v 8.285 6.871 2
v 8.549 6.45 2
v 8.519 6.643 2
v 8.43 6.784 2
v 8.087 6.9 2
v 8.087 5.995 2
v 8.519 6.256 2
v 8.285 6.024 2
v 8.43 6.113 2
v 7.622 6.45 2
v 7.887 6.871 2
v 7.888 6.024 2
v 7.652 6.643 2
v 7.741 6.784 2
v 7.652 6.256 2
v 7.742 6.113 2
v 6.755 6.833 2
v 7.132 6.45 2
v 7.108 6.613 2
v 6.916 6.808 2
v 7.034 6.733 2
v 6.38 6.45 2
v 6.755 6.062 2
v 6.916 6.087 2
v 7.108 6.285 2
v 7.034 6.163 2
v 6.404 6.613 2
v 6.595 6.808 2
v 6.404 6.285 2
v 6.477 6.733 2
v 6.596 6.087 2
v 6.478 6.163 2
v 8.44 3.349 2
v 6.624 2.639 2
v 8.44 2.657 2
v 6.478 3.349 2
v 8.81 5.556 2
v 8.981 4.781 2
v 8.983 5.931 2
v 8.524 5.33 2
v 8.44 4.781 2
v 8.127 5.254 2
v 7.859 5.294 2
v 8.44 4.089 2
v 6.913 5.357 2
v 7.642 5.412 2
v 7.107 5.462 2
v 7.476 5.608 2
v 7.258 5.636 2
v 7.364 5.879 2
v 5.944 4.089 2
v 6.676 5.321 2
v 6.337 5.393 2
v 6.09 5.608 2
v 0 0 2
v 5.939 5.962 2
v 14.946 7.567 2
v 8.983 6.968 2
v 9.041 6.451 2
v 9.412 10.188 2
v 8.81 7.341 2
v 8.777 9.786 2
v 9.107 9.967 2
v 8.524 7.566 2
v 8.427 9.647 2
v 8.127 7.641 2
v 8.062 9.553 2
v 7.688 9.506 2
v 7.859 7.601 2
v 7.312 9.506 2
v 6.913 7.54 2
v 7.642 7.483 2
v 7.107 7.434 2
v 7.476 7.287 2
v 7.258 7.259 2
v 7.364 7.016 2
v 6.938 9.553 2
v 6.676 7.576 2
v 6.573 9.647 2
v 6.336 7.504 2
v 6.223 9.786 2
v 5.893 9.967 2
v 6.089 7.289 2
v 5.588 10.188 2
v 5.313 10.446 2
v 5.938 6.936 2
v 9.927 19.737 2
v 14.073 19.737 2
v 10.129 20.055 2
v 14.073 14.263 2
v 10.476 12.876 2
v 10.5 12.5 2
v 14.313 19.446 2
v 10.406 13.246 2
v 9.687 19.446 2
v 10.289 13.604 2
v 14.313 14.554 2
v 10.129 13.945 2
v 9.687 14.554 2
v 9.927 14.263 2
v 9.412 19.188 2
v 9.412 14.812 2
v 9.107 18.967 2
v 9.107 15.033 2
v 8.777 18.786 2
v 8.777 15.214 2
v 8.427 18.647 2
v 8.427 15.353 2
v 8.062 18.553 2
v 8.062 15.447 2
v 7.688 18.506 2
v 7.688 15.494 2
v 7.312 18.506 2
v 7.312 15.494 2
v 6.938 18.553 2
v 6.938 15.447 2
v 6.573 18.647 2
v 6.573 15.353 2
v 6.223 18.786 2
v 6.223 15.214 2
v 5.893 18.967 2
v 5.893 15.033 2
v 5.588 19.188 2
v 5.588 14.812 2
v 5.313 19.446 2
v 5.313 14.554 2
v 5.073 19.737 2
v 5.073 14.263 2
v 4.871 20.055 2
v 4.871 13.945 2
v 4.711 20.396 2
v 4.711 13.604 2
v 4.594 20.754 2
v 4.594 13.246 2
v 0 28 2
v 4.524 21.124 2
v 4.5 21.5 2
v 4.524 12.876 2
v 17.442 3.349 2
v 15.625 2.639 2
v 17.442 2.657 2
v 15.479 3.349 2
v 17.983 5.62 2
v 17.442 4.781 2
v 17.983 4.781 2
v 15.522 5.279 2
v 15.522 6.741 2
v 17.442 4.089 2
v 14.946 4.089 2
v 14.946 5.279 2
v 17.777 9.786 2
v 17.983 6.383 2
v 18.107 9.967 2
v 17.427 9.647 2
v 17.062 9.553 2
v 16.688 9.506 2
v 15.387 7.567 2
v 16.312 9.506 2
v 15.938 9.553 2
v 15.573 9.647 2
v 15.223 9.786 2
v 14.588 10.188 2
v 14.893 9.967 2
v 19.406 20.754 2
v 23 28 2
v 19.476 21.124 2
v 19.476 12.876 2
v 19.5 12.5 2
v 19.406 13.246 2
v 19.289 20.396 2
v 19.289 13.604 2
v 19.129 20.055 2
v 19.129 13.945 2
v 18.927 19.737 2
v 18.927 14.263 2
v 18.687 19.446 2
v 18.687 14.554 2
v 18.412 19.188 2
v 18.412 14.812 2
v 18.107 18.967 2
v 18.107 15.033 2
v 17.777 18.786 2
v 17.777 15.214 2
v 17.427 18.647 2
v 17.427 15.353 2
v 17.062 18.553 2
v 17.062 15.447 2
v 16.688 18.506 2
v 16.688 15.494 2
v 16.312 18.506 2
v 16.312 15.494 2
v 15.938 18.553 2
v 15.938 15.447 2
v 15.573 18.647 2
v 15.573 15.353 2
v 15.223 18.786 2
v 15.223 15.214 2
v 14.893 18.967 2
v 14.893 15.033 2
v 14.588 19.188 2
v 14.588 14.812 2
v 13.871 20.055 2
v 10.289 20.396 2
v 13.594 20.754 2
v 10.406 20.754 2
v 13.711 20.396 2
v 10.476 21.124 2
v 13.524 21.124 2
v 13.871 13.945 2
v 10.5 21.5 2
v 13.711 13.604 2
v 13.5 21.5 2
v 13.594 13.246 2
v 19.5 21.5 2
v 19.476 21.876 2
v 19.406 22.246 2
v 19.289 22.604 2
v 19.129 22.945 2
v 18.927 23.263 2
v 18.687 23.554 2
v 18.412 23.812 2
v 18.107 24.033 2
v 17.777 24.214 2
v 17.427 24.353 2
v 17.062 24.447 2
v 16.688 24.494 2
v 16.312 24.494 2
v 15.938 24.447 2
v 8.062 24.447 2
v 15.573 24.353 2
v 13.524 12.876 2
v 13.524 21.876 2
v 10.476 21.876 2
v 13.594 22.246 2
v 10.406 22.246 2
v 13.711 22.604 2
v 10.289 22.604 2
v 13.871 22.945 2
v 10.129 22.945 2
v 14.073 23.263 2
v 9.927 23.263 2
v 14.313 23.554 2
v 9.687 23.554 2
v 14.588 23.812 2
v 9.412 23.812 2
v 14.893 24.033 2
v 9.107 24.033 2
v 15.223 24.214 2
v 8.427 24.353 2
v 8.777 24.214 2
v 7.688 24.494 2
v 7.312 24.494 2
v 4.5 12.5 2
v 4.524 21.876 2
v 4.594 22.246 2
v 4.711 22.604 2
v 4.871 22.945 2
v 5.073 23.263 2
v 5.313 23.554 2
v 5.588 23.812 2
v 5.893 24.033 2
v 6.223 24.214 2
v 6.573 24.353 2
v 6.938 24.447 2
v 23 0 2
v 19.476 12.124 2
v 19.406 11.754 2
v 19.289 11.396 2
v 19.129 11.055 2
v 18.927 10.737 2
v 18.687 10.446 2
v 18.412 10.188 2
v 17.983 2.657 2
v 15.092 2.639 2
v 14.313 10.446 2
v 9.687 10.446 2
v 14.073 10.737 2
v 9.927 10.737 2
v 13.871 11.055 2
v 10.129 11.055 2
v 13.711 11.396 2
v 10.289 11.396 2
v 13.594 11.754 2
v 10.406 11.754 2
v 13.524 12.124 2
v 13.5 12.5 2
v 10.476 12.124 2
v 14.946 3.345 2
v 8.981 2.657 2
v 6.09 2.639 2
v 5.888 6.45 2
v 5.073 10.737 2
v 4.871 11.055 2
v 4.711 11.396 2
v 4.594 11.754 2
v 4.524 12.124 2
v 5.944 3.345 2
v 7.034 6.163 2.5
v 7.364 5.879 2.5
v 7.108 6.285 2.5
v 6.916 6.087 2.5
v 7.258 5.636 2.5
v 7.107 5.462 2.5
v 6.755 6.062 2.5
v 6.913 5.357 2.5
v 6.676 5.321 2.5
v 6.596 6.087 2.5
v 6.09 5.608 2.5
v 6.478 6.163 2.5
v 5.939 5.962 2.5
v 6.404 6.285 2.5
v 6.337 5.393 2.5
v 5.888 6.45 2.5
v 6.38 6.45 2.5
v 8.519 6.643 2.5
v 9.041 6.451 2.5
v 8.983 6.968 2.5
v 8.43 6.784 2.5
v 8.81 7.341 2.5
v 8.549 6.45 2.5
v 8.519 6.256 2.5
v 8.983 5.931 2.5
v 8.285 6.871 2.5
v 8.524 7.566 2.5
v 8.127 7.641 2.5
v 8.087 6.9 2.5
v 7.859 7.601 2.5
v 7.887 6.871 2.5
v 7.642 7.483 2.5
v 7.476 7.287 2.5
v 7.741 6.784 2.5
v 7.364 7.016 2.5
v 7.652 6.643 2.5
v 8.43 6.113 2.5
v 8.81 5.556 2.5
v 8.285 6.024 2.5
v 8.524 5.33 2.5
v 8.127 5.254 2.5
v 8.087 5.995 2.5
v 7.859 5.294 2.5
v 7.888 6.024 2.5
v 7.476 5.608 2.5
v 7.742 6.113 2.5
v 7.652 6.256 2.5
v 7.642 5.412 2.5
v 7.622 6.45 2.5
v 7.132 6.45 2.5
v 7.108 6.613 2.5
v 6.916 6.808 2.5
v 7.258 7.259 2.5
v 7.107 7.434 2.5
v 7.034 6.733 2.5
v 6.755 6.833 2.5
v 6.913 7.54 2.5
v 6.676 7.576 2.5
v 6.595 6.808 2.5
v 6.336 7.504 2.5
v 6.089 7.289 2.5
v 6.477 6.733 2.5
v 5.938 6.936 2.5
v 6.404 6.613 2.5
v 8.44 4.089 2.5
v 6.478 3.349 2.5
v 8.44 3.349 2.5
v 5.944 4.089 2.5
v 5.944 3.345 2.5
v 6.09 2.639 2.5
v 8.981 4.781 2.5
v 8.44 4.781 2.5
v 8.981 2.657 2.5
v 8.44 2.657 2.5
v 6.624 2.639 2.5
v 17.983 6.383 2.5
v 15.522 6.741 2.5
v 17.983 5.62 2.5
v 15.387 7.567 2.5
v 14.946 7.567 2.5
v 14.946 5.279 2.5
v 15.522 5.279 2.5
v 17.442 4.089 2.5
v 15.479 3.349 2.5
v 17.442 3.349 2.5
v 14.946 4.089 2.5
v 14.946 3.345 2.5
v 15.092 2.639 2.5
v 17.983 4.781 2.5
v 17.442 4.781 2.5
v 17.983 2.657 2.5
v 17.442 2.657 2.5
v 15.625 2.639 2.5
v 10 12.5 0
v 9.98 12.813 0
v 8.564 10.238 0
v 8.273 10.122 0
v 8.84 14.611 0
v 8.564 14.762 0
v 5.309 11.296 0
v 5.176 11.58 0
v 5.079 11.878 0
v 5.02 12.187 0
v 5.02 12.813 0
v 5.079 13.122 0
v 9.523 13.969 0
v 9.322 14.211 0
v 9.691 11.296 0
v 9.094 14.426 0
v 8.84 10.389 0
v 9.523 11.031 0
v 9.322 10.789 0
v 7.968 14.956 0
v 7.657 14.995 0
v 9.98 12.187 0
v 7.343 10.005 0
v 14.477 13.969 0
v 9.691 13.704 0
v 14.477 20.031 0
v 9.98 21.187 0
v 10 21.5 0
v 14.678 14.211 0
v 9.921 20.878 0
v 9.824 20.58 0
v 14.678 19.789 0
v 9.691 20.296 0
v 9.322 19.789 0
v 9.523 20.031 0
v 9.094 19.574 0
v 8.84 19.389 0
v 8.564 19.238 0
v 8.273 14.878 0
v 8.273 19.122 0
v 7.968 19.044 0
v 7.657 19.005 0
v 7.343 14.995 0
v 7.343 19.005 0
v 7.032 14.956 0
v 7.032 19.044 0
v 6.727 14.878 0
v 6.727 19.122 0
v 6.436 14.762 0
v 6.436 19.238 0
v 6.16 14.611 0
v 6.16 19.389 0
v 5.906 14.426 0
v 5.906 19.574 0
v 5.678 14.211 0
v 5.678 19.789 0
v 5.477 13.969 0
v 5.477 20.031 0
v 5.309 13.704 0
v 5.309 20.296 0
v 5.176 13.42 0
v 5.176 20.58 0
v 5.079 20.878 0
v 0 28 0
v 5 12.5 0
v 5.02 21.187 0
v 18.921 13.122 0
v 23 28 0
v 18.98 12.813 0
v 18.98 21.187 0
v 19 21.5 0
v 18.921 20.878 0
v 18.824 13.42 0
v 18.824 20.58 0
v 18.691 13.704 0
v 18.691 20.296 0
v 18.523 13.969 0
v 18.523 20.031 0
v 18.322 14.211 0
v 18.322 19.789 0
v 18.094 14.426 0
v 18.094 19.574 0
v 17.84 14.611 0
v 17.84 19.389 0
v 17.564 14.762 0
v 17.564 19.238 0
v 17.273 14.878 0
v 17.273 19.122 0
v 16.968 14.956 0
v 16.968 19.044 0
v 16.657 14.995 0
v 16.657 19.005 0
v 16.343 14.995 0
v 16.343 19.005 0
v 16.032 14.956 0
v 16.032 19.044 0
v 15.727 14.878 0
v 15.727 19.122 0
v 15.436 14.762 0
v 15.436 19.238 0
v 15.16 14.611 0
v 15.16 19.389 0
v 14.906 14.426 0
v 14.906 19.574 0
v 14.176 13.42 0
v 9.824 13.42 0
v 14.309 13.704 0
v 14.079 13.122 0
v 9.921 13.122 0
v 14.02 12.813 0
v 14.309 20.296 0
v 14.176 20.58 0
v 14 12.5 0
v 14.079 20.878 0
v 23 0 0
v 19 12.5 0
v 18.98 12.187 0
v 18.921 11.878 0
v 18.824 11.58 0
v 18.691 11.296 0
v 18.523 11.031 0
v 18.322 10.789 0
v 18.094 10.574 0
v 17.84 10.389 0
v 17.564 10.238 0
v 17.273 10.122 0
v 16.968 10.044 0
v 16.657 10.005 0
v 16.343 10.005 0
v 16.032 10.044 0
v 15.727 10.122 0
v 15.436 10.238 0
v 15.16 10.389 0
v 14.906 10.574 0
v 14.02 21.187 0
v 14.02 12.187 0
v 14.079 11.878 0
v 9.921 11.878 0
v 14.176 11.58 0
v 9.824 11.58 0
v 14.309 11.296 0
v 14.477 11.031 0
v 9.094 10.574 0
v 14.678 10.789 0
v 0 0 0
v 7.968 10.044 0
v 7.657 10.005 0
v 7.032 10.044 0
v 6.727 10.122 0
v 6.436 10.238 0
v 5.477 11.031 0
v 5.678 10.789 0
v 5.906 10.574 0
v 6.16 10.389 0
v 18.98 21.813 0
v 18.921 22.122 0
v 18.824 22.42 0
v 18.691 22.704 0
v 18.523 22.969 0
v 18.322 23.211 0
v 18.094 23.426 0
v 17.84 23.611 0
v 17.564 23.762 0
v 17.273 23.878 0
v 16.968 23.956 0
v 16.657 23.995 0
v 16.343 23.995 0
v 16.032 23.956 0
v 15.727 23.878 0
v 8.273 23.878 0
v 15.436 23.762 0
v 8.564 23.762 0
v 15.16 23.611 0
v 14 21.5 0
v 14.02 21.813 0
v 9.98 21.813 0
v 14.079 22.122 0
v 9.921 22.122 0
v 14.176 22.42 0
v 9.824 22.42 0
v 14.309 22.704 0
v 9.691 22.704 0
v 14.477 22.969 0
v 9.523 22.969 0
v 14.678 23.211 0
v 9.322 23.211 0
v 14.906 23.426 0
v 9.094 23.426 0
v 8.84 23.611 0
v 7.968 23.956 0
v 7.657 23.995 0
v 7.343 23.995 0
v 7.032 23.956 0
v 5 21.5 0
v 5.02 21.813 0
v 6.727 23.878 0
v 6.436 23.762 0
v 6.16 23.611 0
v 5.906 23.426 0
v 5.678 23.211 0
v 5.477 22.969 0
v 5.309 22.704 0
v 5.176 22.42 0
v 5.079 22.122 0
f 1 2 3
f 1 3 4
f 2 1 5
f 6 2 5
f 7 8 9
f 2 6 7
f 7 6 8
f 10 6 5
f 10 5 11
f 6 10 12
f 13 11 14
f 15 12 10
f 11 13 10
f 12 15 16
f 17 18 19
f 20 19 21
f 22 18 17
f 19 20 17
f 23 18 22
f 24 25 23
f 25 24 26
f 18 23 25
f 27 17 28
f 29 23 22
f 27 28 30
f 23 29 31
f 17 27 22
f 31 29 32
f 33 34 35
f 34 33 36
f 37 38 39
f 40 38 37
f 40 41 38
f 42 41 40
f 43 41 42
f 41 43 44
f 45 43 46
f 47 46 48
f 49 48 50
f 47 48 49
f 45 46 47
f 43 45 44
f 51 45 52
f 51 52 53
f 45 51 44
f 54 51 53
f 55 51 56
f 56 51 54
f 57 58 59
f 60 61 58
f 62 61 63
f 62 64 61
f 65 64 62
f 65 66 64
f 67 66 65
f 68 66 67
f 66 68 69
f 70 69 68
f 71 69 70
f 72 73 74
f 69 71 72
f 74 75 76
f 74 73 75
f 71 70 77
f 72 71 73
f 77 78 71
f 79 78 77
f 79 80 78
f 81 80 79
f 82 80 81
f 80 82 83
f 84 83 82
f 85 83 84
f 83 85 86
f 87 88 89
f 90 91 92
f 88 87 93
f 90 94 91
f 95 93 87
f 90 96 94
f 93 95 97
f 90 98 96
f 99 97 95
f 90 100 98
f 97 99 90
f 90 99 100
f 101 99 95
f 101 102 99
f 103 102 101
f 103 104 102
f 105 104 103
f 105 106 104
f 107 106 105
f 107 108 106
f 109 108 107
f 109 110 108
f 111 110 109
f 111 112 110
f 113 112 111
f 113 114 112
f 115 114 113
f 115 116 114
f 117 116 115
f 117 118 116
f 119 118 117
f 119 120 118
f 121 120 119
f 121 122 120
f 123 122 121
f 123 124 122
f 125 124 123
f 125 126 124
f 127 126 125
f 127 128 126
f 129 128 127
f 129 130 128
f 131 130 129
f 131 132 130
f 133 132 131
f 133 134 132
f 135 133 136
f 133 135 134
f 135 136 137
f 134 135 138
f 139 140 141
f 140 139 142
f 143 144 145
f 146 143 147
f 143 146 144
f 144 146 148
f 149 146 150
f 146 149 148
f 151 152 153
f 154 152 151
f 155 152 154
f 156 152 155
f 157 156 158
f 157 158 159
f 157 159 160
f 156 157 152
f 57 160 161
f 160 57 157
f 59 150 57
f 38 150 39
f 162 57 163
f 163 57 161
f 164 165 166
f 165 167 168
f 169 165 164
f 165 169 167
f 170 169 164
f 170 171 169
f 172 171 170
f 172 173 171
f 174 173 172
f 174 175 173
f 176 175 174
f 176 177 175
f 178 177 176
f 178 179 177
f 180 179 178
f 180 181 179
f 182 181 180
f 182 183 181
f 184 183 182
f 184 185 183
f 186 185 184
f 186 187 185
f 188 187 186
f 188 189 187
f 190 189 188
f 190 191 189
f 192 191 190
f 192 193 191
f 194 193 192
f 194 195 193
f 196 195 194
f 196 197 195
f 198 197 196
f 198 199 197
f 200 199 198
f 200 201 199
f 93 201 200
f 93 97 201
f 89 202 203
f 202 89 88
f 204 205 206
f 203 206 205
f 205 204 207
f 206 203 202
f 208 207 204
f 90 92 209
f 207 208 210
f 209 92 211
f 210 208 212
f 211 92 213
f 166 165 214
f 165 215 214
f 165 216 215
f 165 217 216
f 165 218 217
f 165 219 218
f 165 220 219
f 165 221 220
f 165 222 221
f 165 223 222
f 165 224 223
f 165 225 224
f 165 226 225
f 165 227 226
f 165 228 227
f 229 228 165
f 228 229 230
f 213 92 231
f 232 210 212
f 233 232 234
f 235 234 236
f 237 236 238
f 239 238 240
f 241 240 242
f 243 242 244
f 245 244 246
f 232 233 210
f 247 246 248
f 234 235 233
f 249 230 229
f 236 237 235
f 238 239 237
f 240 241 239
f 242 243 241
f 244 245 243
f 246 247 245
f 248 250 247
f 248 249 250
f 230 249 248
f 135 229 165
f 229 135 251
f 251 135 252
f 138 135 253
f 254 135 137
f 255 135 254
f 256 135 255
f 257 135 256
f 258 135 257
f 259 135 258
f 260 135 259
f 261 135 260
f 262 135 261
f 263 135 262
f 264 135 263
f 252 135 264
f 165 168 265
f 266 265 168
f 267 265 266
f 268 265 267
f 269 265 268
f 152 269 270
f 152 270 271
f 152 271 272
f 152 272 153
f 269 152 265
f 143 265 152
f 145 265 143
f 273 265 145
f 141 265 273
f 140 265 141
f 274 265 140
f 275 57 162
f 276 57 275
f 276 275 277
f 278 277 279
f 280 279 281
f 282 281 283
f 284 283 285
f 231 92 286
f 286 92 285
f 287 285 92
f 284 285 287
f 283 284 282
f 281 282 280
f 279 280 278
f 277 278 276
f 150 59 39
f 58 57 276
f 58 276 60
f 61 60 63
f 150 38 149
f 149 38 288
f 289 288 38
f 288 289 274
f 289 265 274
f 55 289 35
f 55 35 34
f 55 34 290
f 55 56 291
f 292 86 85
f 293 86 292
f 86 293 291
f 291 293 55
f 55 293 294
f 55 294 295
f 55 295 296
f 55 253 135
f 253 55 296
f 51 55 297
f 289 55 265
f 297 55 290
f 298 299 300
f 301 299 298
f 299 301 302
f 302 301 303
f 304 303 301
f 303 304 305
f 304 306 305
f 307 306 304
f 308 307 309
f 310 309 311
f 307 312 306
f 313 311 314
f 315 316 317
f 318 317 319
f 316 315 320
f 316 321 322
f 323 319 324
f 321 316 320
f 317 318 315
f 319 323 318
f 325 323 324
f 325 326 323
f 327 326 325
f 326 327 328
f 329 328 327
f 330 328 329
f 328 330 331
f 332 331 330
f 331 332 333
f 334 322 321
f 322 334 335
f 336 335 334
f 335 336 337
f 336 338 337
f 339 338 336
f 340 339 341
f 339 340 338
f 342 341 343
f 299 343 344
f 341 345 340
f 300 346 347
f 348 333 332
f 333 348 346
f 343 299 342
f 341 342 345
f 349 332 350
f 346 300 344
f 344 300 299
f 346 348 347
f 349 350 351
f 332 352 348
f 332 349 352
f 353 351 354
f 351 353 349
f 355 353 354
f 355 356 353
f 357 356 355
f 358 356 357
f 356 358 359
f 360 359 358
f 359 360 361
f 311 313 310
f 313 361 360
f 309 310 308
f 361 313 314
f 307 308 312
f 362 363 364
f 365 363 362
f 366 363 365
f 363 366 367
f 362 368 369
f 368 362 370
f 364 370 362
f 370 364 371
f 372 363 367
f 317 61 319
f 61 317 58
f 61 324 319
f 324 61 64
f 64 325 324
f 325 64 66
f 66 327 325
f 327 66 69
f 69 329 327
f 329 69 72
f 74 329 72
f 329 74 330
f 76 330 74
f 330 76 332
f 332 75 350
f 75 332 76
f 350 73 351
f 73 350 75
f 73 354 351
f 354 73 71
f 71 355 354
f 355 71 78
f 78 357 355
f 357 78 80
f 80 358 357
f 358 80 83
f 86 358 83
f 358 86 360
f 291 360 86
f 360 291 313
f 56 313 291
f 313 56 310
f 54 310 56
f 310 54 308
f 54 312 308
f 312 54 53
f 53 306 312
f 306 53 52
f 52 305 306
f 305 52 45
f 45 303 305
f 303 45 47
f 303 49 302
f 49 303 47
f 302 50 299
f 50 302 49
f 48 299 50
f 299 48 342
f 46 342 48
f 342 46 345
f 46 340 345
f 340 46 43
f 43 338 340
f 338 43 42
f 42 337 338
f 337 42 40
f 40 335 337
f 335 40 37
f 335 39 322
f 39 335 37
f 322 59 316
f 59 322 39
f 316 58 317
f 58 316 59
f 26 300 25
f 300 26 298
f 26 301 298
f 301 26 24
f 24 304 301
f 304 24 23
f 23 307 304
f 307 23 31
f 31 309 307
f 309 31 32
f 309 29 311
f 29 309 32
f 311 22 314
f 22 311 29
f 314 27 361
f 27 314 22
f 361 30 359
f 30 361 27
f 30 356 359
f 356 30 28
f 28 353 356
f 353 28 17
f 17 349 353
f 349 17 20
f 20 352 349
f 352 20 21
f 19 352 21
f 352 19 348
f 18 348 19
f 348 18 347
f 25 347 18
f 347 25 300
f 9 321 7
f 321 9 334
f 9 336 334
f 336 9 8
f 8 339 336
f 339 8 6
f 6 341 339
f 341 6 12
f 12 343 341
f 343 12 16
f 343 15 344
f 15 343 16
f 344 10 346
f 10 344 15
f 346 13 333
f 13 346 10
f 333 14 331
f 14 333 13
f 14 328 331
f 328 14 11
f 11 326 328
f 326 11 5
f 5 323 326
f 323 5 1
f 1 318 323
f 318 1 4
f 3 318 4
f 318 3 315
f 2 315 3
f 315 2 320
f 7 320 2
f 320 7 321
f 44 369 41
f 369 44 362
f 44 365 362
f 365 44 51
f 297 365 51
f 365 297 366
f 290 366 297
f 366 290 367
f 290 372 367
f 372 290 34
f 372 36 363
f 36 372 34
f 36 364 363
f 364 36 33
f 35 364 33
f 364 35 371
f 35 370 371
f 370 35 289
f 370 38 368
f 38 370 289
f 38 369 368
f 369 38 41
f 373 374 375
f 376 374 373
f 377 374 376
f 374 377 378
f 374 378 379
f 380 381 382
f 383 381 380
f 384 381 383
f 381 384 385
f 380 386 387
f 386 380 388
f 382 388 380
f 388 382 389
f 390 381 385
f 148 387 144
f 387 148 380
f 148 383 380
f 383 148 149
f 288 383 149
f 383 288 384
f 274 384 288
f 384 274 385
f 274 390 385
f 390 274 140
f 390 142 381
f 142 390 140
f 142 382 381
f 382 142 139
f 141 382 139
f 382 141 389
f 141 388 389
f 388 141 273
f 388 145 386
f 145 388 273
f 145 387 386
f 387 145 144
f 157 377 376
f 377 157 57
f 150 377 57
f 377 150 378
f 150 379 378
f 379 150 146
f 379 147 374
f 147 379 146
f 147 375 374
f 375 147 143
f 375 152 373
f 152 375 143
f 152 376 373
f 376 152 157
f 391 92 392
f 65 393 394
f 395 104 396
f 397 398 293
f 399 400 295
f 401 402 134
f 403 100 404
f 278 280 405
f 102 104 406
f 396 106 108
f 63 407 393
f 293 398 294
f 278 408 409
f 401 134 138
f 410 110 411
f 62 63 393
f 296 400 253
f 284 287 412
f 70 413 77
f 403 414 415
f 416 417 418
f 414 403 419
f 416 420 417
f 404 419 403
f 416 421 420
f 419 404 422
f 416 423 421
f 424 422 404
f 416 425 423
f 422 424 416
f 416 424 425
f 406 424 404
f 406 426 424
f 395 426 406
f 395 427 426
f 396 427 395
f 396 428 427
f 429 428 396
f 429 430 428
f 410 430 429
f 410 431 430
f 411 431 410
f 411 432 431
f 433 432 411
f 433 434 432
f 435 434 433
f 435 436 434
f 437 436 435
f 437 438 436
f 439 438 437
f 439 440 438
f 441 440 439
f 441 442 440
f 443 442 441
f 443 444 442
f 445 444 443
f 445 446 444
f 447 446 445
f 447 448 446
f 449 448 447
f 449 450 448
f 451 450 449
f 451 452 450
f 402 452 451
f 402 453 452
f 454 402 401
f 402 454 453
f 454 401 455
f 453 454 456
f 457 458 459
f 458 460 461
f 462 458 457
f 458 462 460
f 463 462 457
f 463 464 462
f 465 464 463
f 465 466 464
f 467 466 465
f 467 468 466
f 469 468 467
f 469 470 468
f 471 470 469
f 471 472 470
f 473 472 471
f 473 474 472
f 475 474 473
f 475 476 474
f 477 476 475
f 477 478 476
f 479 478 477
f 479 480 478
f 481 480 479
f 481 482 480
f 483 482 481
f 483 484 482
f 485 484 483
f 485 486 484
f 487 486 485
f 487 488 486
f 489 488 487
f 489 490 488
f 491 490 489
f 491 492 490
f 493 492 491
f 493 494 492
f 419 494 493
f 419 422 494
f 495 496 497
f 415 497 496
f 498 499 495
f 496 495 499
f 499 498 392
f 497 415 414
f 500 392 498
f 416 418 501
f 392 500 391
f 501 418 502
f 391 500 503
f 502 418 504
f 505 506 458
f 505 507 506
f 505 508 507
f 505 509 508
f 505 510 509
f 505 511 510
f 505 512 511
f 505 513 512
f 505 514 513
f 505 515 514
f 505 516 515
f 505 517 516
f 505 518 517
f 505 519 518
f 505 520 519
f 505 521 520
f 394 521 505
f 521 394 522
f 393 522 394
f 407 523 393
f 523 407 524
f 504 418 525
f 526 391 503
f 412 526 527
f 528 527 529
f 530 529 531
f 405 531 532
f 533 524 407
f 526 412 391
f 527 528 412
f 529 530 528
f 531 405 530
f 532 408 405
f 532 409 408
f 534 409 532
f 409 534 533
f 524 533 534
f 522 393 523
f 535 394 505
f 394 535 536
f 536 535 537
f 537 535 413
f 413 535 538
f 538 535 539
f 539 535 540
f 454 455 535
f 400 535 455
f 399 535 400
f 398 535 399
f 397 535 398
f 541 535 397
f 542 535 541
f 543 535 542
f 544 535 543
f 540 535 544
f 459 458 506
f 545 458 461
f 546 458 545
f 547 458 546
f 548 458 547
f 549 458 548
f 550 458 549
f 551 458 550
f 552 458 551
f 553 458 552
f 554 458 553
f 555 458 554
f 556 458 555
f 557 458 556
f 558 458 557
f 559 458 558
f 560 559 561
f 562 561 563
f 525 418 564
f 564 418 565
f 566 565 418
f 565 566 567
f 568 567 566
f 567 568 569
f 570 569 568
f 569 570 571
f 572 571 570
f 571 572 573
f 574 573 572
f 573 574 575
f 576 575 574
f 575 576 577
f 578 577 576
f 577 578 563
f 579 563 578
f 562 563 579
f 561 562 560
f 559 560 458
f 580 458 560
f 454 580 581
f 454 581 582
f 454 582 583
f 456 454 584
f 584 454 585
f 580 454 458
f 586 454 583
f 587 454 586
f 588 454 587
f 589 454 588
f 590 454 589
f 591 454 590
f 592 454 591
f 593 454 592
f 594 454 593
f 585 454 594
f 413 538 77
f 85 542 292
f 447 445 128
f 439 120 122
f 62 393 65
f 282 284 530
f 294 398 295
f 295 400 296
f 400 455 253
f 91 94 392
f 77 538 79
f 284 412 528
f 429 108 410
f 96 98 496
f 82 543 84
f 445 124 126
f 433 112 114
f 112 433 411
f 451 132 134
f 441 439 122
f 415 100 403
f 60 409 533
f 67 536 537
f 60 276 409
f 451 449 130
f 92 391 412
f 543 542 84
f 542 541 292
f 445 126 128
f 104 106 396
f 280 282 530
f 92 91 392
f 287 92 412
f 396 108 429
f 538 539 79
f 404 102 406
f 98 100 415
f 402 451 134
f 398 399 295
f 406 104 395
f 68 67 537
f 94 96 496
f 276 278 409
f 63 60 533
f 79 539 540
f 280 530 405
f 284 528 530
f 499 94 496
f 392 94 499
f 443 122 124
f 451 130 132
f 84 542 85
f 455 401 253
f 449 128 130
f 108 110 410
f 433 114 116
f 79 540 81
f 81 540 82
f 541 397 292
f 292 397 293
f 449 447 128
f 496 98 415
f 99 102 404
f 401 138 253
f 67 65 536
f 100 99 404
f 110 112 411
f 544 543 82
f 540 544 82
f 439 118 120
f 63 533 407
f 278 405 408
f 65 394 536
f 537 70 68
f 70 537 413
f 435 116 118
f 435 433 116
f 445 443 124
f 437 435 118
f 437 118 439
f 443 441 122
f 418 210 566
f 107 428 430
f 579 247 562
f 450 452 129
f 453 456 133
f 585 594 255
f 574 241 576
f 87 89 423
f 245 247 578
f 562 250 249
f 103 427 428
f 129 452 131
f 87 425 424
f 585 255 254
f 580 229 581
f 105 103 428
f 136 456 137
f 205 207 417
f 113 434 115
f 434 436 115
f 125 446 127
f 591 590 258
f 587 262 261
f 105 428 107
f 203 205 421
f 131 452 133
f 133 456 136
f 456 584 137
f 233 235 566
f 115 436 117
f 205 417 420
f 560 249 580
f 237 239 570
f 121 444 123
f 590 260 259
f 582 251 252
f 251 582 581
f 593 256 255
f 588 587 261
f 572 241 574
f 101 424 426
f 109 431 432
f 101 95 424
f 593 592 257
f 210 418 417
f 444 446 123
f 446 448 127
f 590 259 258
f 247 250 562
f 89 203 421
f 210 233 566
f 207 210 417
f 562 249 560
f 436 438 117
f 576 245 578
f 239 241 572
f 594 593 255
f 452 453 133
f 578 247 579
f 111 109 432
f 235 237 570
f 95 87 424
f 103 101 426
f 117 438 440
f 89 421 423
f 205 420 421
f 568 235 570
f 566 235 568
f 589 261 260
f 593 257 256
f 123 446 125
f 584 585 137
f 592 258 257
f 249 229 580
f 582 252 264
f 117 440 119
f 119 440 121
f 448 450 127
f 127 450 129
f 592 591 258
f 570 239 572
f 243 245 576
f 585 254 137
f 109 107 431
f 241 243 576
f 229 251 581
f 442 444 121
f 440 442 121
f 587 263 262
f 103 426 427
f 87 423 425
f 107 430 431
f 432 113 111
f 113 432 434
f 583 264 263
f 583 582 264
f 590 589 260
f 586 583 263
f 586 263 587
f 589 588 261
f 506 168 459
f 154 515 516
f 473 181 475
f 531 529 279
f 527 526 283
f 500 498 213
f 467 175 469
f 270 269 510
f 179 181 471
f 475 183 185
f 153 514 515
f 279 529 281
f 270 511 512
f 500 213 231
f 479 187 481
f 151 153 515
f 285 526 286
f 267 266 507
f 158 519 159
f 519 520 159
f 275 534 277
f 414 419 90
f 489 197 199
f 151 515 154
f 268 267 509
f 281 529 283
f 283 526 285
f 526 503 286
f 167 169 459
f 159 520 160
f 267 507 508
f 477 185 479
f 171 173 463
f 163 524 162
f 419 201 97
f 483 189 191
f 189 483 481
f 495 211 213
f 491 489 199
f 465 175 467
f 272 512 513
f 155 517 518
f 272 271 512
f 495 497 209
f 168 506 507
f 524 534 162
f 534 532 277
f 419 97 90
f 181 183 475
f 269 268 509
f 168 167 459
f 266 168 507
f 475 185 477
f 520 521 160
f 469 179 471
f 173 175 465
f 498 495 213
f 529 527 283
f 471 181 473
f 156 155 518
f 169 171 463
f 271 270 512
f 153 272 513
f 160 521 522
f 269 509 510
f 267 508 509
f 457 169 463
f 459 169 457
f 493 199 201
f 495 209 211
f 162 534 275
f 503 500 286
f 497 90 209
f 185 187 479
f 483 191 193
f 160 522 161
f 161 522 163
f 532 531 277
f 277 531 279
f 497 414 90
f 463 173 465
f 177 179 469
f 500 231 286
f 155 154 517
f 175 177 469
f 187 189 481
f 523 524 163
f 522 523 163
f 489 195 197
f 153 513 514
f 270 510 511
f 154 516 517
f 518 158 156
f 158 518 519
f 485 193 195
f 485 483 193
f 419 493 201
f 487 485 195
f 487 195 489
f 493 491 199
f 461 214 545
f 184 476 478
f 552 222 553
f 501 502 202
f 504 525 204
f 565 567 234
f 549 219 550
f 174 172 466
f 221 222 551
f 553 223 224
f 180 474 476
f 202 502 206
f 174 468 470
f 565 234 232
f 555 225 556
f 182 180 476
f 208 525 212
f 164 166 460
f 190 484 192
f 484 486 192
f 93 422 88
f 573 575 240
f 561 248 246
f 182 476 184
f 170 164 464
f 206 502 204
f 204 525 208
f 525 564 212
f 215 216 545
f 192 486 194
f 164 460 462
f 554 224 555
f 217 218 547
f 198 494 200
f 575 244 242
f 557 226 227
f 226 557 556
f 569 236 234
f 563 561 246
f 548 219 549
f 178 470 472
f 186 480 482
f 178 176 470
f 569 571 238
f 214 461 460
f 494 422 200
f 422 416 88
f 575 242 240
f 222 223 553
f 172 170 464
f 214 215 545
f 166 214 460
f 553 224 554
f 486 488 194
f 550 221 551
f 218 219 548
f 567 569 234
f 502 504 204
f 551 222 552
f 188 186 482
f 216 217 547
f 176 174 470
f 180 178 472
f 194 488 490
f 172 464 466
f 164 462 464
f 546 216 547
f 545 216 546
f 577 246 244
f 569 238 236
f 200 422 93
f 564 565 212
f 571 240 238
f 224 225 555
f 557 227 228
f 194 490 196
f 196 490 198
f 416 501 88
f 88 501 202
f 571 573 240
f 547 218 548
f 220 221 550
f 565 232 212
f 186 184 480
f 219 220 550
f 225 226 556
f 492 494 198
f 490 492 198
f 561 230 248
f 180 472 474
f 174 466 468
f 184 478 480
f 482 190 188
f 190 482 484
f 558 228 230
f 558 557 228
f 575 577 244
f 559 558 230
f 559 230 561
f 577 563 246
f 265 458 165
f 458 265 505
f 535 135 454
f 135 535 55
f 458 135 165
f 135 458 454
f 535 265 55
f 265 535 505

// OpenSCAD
echo(version=version());

circleD = 6;
circleDSmall = 5;
circleGap = 3;

bevelDepth = 1;

baseDepth = 2;

baseMargin = 4;

cols = 2;
rows = 2;

// cols = 1;
// rows = 1;

extraTextAreaWidth = 5;

textDepth = 0.5;

baseLength = rows * circleD + (rows - 1) * circleGap + 2 * baseMargin;
baseWidth = cols * circleD + (cols - 1) * circleGap + 2 * baseMargin + extraTextAreaWidth;

echo("base width");
echo(baseWidth);
echo("base length");
echo(baseLength);

module hole() {
    translate([
        (circleGap + circleD) / 2,
        (circleGap + circleD) / 2,
    ])
    color("red")
    // cylinder(h=baseDepth,d=circleD, $fn=50);
    // translate([0,0,baseDepth])
    cylinder(baseDepth, d1=circleDSmall, d2=circleD, $fn=50);
}

module holes() {
    for ( j = [0 : rows - 1] ){
        for ( i = [0 : cols - 1] ){
            translate([
                (circleGap + circleD) * j + circleD / 2,
                (circleGap + circleD) * i + circleD / 2 + extraTextAreaWidth,
            ])
            // difference() {
            //     cube([circleD + circleGap, circleD + circleGap, baseDepth]);
                hole();
            // }
        }
    }
}

module holeNumbers() {
     for ( j = [0 : rows - 1] ){ 
        translate([
            (circleGap + circleD) * j + circleD / 2 + baseMargin + 0.5,
            5,
            baseDepth
        ])
        rotate([0, 0, 90])
        linear_extrude(textDepth)
        text(
            str(rows - j + 16),
            font="tahoma:style=Bold",
            size = 3,
            halign= "center",
            valign="center"
        );
    }
}

module cutOut() {
    translate([(baseLength / 2) - 10,0,0]) {
        cube([baseLength, baseWidth, baseDepth * 2]);
    }
}

holeNumbers();

difference() {
    cube([baseLength, baseWidth, baseDepth]);
    holes();
}
